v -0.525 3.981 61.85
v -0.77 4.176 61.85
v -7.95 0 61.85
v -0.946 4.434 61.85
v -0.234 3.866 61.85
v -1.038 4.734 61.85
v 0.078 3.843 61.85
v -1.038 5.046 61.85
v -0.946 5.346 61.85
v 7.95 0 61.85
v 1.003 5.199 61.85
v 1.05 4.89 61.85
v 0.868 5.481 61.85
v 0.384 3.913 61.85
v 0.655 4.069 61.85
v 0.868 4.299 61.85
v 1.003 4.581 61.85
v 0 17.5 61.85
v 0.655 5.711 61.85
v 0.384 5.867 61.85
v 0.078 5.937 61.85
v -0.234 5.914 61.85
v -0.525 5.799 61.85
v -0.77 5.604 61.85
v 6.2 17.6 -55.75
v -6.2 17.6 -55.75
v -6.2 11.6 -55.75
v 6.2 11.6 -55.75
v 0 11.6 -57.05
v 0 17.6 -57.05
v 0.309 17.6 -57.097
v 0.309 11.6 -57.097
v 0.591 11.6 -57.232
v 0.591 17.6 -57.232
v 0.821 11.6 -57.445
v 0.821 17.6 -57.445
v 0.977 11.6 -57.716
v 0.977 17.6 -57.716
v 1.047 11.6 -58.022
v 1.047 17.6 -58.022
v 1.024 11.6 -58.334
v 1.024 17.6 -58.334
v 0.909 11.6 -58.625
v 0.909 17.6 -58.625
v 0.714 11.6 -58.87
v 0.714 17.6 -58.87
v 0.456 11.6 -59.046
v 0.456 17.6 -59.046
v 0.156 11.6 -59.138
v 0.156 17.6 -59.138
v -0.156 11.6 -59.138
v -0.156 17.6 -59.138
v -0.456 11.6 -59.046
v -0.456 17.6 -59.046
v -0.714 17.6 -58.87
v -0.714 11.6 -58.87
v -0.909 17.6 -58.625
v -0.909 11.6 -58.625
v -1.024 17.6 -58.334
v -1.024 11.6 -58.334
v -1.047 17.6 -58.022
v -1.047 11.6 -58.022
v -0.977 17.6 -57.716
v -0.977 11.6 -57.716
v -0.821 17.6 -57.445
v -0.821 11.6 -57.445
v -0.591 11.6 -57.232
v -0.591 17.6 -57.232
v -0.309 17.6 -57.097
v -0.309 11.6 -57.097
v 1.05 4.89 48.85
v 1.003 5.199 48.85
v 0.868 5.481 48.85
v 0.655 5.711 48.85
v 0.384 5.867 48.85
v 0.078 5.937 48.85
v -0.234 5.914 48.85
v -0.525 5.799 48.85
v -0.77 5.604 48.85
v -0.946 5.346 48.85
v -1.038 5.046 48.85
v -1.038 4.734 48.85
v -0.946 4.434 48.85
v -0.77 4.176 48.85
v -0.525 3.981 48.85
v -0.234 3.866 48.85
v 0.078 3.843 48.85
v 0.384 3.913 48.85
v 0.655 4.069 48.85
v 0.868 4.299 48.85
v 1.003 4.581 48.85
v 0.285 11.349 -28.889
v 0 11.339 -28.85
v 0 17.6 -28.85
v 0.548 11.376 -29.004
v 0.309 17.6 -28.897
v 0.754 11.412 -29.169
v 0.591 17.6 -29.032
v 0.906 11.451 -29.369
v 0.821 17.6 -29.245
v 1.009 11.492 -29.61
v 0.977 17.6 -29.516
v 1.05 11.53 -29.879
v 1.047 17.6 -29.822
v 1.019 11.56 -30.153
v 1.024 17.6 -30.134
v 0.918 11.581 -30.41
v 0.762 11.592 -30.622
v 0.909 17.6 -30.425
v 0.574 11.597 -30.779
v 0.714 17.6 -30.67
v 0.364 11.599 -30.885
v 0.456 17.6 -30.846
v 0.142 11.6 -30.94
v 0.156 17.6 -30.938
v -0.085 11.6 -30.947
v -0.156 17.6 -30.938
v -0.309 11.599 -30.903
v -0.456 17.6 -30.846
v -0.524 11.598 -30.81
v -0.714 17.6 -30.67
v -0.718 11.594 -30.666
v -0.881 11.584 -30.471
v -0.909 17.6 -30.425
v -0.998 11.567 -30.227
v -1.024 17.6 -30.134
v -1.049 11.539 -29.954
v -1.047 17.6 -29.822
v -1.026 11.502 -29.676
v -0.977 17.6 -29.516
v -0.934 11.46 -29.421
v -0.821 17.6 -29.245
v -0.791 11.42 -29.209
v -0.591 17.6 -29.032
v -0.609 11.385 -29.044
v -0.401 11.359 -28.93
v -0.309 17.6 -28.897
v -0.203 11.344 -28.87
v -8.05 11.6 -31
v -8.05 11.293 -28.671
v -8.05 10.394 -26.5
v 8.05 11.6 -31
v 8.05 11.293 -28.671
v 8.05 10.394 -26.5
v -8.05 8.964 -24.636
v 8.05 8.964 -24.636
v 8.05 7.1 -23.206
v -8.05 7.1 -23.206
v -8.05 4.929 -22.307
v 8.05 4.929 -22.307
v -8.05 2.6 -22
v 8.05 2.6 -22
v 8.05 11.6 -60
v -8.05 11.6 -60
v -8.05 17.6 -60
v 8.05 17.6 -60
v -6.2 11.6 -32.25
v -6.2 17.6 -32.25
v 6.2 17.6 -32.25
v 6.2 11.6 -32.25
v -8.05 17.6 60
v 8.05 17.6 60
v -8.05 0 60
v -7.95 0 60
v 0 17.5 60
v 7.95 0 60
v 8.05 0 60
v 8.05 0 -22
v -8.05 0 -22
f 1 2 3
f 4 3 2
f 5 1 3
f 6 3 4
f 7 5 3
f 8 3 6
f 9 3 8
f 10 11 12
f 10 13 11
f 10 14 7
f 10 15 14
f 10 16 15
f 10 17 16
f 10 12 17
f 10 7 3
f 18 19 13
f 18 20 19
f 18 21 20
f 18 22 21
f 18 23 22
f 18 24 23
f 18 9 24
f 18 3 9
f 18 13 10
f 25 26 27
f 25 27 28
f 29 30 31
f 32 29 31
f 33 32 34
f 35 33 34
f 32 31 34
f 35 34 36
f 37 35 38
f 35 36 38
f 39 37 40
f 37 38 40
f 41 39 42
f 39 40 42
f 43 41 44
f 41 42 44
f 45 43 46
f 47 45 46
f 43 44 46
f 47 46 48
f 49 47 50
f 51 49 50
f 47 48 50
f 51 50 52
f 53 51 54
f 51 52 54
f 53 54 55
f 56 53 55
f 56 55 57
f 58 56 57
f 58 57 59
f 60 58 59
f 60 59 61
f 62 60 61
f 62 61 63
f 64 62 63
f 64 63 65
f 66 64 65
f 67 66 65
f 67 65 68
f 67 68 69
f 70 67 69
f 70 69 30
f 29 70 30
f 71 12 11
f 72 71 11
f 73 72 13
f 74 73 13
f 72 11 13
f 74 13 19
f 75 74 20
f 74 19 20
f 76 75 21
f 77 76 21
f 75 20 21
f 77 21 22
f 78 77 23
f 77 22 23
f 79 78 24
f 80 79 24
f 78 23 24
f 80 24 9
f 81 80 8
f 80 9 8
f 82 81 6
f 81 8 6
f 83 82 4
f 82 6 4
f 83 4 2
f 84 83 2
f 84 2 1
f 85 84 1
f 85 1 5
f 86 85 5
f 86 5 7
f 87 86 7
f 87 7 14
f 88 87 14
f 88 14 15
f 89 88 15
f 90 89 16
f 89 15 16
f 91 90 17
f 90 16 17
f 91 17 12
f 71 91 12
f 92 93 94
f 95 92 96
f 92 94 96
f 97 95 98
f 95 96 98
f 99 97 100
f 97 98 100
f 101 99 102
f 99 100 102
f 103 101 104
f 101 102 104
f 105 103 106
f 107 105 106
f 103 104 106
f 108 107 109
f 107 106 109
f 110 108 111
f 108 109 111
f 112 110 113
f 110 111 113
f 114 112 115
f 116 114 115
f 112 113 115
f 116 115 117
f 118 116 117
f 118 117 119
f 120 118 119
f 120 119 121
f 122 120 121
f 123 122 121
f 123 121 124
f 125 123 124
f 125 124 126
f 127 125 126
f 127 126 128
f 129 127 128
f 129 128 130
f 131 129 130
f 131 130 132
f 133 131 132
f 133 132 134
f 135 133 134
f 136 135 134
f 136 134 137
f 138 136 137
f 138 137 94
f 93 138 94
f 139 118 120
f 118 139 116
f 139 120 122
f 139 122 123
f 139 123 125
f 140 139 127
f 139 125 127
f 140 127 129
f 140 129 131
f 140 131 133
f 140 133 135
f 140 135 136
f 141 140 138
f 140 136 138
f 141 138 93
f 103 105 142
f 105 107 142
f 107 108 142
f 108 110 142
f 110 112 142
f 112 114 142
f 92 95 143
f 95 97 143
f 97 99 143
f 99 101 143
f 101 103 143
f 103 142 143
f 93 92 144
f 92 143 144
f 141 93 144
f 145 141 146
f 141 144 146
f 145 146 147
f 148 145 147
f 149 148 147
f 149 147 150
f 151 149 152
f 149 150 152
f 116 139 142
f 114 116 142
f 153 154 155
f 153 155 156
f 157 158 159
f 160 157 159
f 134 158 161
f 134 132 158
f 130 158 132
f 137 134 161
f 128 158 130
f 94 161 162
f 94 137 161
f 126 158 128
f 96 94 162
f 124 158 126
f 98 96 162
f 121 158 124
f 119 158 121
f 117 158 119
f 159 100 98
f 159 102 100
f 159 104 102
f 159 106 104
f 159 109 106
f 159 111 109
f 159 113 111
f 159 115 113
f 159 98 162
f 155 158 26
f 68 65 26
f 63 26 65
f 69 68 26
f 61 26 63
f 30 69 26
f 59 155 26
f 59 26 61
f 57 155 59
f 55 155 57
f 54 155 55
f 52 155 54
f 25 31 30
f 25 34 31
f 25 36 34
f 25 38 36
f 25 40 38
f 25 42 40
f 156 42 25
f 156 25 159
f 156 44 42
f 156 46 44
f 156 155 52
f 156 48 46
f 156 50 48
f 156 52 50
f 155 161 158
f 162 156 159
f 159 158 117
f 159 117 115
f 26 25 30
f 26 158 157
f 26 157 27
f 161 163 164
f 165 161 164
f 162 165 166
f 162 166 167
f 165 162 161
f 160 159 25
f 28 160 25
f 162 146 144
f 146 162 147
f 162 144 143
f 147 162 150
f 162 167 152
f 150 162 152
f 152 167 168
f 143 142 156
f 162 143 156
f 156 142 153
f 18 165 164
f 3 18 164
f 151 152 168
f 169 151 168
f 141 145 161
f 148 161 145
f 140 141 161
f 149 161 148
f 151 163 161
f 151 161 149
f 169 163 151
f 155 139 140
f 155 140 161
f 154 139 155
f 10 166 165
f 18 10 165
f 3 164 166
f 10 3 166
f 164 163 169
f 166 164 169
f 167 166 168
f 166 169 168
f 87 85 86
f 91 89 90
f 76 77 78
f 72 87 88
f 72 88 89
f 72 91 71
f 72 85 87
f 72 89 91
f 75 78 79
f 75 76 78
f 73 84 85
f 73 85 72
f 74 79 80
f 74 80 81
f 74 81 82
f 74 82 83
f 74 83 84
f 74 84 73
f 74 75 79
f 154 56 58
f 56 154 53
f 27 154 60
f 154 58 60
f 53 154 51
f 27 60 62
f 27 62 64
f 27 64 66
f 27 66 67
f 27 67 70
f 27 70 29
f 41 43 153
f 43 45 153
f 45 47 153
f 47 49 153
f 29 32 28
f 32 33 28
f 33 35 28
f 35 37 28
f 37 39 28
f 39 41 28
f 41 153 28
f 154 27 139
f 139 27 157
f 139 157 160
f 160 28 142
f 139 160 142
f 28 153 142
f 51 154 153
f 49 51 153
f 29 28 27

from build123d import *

# Parameters (mm, degrees)
SKIZZE1_W                       = 16.1
SKIZZE1_H                       = 120
AUFSATZ_LINEAR_AUSTRAGEN1_DEPTH = 17.6
AUFSATZ_LINEAR_AUSTRAGEN2_DEPTH = 1.85
SKIZZE3_R                       = 1.05
SCHNITT_LINEAR_AUSTRAGEN1_DEPTH = 13
SKIZZE4_R                       = 1.05
SKIZZE4_W                       = 12.4
SKIZZE4_H                       = 23.5
SCHNITT_LINEAR_AUSTRAGEN2_DEPTH = 65.807291256
SCHNITT_LINEAR_AUSTRAGEN3_DEPTH = 67.29021421


with BuildPart() as part:
    # Skizze1 → Aufsatz-Linear austragen1 (new body)
    with BuildSketch(Plane(origin=(0, 0, 0), x_dir=(1, 0, 0), z_dir=(0, 1, 0))):
        Rectangle(SKIZZE1_W, SKIZZE1_H)
    extrude(amount=AUFSATZ_LINEAR_AUSTRAGEN1_DEPTH)

    # Skizze2 → Aufsatz-Linear austragen2 (add)
    with BuildSketch(Plane.XY.offset(60)):
        Polygon((0, 17.5), (-7.95, 0), (7.95, 0), align=None)
    extrude(amount=AUFSATZ_LINEAR_AUSTRAGEN2_DEPTH)

    # Skizze3 → Schnitt-Linear austragen1 (cut)
    with BuildSketch(Plane.XY.offset(61.85)):
        with Locations((0, 4.89)):
            Circle(SKIZZE3_R)
    extrude(amount=-SCHNITT_LINEAR_AUSTRAGEN1_DEPTH, mode=Mode.SUBTRACT)

    # Skizze4 → Schnitt-Linear austragen2 (cut, through all)
    with BuildSketch(Plane(origin=(0, 17.6, 0), x_dir=(1, 0, 0), z_dir=(0, 1, 0))):
        with Locations(Location((0, 58.1, 0), (0, 0, 270))):
            Circle(SKIZZE4_R)
        with Locations(Location((0, 29.9, 0), (0, 0, 270))):
            Circle(SKIZZE4_R)
        with Locations((0, 44)):
            Rectangle(SKIZZE4_W, SKIZZE4_H)
    extrude(amount=-SCHNITT_LINEAR_AUSTRAGEN2_DEPTH, mode=Mode.SUBTRACT)

    # Skizze5 → Schnitt-Linear austragen3 (cut, through all)
    with BuildSketch(Plane(origin=(8.05, 0, 0), x_dir=(0, 0, -1), z_dir=(1, 0, 0))):
        with BuildLine():
            Line((60, 11.6), (31, 11.6))
            ThreePointArc((31, 11.6), (24.636038969, 8.963961031), (22, 2.6))
            Line((22, 2.6), (22, 0))
            Line((22, 0), (60, 0))
            Line((60, 0), (60, 11.6))
        make_face()
    extrude(amount=-SCHNITT_LINEAR_AUSTRAGEN3_DEPTH, mode=Mode.SUBTRACT)


solid = part.part
